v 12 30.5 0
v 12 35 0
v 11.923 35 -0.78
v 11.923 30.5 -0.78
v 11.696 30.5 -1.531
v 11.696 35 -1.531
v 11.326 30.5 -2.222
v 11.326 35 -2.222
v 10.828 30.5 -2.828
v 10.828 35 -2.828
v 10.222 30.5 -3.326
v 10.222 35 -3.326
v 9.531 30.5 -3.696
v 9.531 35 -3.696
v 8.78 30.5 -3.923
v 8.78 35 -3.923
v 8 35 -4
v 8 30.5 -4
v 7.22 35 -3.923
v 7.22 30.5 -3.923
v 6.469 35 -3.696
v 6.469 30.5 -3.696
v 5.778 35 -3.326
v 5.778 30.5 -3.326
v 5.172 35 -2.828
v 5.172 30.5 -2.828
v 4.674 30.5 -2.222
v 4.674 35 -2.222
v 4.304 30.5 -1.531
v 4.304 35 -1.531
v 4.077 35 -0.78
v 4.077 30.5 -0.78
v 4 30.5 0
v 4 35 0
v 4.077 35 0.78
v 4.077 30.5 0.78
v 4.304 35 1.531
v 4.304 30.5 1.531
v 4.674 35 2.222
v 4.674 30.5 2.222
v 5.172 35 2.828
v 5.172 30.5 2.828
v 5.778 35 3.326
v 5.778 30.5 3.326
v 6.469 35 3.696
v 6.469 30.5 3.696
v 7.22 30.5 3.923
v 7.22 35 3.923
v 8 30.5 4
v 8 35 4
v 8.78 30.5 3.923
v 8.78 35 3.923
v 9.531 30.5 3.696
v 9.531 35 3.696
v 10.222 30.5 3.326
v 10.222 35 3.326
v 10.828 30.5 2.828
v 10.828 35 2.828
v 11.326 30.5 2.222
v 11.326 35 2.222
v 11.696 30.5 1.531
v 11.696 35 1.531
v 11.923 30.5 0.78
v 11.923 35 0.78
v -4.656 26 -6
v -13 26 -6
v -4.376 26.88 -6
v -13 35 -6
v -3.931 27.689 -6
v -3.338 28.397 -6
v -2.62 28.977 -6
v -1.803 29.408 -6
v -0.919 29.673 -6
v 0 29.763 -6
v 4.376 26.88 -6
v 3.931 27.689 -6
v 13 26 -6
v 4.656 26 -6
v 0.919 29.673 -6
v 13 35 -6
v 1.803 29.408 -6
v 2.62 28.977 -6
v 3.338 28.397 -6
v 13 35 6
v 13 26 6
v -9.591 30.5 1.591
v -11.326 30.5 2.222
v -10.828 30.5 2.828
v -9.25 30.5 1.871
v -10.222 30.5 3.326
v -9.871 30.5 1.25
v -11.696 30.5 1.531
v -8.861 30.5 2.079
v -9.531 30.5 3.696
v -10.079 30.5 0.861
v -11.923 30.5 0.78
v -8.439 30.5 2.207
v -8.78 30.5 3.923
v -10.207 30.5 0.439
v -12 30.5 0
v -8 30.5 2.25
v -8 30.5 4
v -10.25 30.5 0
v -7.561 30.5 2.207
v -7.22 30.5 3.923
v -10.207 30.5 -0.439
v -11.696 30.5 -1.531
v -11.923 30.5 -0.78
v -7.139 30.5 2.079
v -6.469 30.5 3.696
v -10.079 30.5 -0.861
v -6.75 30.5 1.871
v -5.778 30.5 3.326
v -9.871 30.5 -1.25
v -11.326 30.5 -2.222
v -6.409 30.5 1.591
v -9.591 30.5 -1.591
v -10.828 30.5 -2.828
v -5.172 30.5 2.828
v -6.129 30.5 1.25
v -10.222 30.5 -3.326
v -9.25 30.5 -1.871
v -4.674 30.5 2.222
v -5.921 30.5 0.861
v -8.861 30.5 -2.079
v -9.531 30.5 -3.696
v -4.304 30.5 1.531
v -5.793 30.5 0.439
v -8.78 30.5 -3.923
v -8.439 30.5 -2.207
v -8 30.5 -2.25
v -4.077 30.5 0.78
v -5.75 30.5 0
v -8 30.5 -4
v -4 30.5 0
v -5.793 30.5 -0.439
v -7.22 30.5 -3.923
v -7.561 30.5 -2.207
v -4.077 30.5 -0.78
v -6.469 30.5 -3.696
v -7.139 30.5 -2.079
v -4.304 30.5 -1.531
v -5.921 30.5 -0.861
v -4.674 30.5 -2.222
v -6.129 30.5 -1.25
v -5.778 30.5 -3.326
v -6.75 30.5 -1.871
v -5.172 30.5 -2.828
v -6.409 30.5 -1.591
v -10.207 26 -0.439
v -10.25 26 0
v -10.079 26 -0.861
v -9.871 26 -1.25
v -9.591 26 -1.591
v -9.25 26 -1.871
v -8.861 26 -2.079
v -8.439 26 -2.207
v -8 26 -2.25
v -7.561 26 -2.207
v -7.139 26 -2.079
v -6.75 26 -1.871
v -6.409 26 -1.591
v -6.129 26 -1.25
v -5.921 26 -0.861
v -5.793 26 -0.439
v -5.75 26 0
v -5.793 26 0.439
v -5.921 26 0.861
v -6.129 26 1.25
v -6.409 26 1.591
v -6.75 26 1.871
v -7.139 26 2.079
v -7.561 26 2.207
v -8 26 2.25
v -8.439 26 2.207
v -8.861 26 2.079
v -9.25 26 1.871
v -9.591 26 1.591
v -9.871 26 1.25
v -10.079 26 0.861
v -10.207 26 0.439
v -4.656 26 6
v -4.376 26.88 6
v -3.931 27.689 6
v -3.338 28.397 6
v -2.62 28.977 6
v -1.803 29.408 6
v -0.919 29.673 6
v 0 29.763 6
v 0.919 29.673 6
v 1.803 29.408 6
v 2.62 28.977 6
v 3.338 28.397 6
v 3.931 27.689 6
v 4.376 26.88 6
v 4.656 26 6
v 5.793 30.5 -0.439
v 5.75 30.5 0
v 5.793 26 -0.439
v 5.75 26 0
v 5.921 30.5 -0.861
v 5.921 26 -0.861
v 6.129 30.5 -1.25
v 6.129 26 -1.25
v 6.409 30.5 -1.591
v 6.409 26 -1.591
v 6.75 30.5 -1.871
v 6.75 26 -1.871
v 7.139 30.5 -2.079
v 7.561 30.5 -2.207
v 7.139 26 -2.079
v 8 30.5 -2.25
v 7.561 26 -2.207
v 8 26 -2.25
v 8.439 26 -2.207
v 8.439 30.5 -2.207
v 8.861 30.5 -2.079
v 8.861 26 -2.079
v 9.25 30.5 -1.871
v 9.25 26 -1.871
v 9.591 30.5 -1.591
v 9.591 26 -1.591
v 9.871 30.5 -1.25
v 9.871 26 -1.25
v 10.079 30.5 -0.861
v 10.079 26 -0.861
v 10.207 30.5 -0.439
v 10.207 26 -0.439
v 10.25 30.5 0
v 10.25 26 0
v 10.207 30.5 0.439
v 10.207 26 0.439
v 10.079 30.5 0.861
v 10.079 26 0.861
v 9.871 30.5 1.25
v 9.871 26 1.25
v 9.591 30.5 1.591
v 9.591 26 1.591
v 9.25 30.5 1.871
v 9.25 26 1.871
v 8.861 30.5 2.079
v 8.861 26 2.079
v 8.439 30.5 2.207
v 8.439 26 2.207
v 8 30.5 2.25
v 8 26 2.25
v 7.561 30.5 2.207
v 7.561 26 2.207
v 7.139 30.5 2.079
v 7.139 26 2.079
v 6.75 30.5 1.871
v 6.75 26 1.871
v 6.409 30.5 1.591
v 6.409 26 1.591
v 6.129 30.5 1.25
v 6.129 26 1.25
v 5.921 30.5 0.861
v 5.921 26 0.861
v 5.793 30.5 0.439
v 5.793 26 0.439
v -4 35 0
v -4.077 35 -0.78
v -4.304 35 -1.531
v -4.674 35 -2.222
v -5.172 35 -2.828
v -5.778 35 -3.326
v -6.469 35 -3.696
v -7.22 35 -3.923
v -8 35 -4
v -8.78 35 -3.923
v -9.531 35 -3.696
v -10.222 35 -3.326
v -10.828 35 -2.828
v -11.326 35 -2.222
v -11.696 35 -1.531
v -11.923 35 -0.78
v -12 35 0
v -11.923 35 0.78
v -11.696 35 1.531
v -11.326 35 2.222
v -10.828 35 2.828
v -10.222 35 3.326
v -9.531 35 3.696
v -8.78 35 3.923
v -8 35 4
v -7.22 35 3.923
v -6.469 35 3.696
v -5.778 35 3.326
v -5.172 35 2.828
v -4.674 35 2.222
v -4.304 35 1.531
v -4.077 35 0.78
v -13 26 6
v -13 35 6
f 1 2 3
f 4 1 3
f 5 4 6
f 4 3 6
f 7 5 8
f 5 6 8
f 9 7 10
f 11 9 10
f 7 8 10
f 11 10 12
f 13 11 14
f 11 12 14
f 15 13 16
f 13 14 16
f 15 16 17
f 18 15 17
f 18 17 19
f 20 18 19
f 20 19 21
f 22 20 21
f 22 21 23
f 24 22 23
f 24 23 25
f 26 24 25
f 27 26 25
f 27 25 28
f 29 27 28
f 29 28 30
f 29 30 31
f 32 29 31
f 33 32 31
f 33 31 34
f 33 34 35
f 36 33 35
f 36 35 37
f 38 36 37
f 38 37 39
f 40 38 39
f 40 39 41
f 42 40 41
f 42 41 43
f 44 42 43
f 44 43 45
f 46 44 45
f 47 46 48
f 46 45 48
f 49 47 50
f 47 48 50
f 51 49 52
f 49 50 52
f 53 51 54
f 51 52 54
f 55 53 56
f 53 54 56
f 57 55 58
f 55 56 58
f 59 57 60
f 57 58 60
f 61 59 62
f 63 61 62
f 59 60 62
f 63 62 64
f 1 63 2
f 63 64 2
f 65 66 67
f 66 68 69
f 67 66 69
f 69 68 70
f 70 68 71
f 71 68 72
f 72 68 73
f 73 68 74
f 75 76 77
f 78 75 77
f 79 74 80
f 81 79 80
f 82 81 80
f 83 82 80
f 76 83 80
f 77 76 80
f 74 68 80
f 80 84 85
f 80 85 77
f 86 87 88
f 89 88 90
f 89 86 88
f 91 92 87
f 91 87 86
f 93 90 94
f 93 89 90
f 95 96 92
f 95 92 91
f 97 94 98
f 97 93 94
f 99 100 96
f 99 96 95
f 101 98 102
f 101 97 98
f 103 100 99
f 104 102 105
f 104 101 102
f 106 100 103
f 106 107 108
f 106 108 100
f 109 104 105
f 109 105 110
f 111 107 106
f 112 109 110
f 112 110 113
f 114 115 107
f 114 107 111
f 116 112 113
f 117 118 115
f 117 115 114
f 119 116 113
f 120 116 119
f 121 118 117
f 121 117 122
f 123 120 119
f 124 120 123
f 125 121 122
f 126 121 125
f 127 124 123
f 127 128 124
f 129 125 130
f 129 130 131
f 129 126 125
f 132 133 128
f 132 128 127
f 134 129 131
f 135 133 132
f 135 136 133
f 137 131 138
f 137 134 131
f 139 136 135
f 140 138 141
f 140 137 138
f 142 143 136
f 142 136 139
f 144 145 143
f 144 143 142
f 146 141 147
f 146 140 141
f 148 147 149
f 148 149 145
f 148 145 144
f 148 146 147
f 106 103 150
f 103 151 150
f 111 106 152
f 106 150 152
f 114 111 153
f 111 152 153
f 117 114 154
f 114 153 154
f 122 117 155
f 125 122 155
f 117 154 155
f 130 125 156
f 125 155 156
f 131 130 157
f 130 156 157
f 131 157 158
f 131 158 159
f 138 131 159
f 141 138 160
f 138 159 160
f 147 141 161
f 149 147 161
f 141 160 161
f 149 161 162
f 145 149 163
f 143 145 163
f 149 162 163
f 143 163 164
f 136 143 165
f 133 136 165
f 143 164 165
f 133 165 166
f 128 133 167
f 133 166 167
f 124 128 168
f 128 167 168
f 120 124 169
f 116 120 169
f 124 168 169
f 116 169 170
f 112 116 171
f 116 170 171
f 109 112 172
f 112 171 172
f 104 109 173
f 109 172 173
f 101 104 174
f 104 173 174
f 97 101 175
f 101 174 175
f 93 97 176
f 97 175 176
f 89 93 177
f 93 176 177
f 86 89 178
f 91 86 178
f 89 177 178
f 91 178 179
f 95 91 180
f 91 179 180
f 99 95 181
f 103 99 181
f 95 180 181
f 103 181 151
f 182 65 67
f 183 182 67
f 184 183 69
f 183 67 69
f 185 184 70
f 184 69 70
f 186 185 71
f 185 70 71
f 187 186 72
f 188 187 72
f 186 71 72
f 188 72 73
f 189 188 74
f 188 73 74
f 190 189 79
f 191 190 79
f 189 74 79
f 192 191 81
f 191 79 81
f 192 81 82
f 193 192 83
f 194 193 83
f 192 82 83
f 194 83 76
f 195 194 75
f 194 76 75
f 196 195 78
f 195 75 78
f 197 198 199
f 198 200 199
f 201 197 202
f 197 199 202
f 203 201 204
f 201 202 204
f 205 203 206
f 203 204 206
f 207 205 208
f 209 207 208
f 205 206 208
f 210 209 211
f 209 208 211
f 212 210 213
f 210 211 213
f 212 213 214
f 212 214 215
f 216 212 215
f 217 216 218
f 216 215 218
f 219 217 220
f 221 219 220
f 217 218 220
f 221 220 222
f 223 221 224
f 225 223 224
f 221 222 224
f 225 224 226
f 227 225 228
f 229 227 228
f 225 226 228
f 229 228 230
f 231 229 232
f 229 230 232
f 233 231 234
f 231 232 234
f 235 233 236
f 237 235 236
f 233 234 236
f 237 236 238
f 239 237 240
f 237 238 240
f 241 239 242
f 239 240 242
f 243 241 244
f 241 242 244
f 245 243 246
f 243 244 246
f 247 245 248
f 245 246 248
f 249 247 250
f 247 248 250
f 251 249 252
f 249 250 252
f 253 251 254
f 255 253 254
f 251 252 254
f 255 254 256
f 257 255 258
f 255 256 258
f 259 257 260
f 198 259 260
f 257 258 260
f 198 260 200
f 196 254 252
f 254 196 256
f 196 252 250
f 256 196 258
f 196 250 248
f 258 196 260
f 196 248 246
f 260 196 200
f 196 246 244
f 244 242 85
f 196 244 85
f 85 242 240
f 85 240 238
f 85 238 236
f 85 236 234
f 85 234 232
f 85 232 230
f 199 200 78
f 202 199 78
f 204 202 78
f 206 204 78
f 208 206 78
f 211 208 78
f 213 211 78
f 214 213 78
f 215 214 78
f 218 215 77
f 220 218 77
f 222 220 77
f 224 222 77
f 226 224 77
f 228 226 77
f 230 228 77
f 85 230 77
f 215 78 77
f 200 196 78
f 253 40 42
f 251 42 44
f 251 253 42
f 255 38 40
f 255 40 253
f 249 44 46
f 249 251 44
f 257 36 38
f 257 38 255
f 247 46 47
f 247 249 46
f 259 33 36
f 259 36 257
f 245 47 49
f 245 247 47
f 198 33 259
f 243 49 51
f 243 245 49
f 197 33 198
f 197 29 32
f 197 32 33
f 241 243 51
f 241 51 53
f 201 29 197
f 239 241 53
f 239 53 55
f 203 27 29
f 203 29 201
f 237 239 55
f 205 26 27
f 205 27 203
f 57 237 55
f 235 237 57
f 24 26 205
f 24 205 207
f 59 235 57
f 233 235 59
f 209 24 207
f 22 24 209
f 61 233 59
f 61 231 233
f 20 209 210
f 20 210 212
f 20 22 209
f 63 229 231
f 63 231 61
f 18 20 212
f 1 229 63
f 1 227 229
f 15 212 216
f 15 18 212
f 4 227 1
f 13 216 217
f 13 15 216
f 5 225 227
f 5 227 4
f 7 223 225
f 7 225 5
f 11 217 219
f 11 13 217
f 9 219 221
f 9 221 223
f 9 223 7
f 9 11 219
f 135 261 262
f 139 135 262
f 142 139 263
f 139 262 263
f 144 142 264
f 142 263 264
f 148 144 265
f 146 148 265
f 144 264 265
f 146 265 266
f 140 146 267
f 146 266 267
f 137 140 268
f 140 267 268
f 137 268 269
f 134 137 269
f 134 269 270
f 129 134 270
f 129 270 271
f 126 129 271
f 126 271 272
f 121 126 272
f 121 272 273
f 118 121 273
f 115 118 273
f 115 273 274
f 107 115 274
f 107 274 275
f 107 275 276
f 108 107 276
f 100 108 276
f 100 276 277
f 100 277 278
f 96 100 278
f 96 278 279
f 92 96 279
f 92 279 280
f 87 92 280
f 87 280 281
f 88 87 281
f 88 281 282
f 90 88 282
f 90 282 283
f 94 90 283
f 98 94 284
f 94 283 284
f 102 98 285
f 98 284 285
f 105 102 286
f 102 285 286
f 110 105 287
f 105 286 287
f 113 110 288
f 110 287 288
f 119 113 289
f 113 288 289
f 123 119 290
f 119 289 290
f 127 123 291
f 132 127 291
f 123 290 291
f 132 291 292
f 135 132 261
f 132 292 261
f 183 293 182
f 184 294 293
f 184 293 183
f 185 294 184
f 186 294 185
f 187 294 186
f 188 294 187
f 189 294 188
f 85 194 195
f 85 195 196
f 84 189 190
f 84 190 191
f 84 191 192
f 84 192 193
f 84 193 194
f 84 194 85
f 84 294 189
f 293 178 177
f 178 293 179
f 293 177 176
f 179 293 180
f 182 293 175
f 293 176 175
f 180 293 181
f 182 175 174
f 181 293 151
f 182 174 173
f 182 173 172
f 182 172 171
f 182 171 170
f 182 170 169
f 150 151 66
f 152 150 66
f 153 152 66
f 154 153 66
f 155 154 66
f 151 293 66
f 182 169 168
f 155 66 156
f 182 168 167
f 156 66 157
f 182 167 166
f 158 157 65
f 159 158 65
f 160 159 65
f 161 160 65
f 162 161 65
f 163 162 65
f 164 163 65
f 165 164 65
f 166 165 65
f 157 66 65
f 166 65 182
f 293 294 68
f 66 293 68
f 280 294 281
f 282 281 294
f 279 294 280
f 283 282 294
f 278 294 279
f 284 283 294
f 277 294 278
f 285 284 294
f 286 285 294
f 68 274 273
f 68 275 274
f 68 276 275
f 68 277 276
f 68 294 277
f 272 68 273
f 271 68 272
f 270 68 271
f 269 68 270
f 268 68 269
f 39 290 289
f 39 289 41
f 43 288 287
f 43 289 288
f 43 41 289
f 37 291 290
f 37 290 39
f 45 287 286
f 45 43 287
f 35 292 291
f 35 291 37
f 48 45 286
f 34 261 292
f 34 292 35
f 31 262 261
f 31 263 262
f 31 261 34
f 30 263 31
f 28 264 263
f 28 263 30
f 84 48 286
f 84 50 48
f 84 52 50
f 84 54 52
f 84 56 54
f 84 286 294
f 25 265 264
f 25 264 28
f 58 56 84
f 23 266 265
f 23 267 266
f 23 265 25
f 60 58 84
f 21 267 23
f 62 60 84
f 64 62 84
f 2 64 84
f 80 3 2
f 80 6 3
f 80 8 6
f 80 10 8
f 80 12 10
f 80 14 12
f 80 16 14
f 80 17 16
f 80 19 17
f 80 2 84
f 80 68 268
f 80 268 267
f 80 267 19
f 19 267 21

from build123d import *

# Parameters (mm, degrees)
SKETCH1_W                                        = 26
SKETCH1_H                                        = 12
BOSS_EXTRUDE1_DEPTH                              = 9
CUT_EXTRUDE1_DEPTH                               = 40.217343102
CBORE_FOR_M4_HEX_HEAD_MACHINE_SCREW1_D           = 4.5
CBORE_FOR_M4_HEX_HEAD_MACHINE_SCREW1_CBORE_D     = 8
CBORE_FOR_M4_HEX_HEAD_MACHINE_SCREW1_CBORE_DEPTH = 4.5


with BuildPart() as part:
    # Sketch1 → Boss-Extrude1 (new body)
    with BuildSketch(Plane(origin=(0, 35, 0), x_dir=(1, 0, 0), z_dir=(0, 1, 0))):
        Rectangle(SKETCH1_W, SKETCH1_H)
    extrude(amount=-BOSS_EXTRUDE1_DEPTH)

    # Sketch2 → Cut-Extrude1 (cut, through all)
    with BuildSketch(Plane(origin=(0, 0, -6), x_dir=(-1, 0, 0), z_dir=(0, 0, -1))):
        with BuildLine():
            Line((-4.656329697, 26), (4.656329697, 26))
            ThreePointArc((4.656329697, 26), (0, 29.7625), (-4.656329697, 26))
        make_face()
    extrude(amount=-CUT_EXTRUDE1_DEPTH, mode=Mode.SUBTRACT)

    # CBORE for M4 Hex Head Machine Screw1 (through all)
    with Locations(Plane(origin=(0, 35, 0), x_dir=(1, 0, 0), z_dir=(0, 1, 0))):
        with Locations((-8, 0), (8, 0)):
            CounterBoreHole(CBORE_FOR_M4_HEX_HEAD_MACHINE_SCREW1_D / 2, CBORE_FOR_M4_HEX_HEAD_MACHINE_SCREW1_CBORE_D / 2, CBORE_FOR_M4_HEX_HEAD_MACHINE_SCREW1_CBORE_DEPTH)


solid = part.part
